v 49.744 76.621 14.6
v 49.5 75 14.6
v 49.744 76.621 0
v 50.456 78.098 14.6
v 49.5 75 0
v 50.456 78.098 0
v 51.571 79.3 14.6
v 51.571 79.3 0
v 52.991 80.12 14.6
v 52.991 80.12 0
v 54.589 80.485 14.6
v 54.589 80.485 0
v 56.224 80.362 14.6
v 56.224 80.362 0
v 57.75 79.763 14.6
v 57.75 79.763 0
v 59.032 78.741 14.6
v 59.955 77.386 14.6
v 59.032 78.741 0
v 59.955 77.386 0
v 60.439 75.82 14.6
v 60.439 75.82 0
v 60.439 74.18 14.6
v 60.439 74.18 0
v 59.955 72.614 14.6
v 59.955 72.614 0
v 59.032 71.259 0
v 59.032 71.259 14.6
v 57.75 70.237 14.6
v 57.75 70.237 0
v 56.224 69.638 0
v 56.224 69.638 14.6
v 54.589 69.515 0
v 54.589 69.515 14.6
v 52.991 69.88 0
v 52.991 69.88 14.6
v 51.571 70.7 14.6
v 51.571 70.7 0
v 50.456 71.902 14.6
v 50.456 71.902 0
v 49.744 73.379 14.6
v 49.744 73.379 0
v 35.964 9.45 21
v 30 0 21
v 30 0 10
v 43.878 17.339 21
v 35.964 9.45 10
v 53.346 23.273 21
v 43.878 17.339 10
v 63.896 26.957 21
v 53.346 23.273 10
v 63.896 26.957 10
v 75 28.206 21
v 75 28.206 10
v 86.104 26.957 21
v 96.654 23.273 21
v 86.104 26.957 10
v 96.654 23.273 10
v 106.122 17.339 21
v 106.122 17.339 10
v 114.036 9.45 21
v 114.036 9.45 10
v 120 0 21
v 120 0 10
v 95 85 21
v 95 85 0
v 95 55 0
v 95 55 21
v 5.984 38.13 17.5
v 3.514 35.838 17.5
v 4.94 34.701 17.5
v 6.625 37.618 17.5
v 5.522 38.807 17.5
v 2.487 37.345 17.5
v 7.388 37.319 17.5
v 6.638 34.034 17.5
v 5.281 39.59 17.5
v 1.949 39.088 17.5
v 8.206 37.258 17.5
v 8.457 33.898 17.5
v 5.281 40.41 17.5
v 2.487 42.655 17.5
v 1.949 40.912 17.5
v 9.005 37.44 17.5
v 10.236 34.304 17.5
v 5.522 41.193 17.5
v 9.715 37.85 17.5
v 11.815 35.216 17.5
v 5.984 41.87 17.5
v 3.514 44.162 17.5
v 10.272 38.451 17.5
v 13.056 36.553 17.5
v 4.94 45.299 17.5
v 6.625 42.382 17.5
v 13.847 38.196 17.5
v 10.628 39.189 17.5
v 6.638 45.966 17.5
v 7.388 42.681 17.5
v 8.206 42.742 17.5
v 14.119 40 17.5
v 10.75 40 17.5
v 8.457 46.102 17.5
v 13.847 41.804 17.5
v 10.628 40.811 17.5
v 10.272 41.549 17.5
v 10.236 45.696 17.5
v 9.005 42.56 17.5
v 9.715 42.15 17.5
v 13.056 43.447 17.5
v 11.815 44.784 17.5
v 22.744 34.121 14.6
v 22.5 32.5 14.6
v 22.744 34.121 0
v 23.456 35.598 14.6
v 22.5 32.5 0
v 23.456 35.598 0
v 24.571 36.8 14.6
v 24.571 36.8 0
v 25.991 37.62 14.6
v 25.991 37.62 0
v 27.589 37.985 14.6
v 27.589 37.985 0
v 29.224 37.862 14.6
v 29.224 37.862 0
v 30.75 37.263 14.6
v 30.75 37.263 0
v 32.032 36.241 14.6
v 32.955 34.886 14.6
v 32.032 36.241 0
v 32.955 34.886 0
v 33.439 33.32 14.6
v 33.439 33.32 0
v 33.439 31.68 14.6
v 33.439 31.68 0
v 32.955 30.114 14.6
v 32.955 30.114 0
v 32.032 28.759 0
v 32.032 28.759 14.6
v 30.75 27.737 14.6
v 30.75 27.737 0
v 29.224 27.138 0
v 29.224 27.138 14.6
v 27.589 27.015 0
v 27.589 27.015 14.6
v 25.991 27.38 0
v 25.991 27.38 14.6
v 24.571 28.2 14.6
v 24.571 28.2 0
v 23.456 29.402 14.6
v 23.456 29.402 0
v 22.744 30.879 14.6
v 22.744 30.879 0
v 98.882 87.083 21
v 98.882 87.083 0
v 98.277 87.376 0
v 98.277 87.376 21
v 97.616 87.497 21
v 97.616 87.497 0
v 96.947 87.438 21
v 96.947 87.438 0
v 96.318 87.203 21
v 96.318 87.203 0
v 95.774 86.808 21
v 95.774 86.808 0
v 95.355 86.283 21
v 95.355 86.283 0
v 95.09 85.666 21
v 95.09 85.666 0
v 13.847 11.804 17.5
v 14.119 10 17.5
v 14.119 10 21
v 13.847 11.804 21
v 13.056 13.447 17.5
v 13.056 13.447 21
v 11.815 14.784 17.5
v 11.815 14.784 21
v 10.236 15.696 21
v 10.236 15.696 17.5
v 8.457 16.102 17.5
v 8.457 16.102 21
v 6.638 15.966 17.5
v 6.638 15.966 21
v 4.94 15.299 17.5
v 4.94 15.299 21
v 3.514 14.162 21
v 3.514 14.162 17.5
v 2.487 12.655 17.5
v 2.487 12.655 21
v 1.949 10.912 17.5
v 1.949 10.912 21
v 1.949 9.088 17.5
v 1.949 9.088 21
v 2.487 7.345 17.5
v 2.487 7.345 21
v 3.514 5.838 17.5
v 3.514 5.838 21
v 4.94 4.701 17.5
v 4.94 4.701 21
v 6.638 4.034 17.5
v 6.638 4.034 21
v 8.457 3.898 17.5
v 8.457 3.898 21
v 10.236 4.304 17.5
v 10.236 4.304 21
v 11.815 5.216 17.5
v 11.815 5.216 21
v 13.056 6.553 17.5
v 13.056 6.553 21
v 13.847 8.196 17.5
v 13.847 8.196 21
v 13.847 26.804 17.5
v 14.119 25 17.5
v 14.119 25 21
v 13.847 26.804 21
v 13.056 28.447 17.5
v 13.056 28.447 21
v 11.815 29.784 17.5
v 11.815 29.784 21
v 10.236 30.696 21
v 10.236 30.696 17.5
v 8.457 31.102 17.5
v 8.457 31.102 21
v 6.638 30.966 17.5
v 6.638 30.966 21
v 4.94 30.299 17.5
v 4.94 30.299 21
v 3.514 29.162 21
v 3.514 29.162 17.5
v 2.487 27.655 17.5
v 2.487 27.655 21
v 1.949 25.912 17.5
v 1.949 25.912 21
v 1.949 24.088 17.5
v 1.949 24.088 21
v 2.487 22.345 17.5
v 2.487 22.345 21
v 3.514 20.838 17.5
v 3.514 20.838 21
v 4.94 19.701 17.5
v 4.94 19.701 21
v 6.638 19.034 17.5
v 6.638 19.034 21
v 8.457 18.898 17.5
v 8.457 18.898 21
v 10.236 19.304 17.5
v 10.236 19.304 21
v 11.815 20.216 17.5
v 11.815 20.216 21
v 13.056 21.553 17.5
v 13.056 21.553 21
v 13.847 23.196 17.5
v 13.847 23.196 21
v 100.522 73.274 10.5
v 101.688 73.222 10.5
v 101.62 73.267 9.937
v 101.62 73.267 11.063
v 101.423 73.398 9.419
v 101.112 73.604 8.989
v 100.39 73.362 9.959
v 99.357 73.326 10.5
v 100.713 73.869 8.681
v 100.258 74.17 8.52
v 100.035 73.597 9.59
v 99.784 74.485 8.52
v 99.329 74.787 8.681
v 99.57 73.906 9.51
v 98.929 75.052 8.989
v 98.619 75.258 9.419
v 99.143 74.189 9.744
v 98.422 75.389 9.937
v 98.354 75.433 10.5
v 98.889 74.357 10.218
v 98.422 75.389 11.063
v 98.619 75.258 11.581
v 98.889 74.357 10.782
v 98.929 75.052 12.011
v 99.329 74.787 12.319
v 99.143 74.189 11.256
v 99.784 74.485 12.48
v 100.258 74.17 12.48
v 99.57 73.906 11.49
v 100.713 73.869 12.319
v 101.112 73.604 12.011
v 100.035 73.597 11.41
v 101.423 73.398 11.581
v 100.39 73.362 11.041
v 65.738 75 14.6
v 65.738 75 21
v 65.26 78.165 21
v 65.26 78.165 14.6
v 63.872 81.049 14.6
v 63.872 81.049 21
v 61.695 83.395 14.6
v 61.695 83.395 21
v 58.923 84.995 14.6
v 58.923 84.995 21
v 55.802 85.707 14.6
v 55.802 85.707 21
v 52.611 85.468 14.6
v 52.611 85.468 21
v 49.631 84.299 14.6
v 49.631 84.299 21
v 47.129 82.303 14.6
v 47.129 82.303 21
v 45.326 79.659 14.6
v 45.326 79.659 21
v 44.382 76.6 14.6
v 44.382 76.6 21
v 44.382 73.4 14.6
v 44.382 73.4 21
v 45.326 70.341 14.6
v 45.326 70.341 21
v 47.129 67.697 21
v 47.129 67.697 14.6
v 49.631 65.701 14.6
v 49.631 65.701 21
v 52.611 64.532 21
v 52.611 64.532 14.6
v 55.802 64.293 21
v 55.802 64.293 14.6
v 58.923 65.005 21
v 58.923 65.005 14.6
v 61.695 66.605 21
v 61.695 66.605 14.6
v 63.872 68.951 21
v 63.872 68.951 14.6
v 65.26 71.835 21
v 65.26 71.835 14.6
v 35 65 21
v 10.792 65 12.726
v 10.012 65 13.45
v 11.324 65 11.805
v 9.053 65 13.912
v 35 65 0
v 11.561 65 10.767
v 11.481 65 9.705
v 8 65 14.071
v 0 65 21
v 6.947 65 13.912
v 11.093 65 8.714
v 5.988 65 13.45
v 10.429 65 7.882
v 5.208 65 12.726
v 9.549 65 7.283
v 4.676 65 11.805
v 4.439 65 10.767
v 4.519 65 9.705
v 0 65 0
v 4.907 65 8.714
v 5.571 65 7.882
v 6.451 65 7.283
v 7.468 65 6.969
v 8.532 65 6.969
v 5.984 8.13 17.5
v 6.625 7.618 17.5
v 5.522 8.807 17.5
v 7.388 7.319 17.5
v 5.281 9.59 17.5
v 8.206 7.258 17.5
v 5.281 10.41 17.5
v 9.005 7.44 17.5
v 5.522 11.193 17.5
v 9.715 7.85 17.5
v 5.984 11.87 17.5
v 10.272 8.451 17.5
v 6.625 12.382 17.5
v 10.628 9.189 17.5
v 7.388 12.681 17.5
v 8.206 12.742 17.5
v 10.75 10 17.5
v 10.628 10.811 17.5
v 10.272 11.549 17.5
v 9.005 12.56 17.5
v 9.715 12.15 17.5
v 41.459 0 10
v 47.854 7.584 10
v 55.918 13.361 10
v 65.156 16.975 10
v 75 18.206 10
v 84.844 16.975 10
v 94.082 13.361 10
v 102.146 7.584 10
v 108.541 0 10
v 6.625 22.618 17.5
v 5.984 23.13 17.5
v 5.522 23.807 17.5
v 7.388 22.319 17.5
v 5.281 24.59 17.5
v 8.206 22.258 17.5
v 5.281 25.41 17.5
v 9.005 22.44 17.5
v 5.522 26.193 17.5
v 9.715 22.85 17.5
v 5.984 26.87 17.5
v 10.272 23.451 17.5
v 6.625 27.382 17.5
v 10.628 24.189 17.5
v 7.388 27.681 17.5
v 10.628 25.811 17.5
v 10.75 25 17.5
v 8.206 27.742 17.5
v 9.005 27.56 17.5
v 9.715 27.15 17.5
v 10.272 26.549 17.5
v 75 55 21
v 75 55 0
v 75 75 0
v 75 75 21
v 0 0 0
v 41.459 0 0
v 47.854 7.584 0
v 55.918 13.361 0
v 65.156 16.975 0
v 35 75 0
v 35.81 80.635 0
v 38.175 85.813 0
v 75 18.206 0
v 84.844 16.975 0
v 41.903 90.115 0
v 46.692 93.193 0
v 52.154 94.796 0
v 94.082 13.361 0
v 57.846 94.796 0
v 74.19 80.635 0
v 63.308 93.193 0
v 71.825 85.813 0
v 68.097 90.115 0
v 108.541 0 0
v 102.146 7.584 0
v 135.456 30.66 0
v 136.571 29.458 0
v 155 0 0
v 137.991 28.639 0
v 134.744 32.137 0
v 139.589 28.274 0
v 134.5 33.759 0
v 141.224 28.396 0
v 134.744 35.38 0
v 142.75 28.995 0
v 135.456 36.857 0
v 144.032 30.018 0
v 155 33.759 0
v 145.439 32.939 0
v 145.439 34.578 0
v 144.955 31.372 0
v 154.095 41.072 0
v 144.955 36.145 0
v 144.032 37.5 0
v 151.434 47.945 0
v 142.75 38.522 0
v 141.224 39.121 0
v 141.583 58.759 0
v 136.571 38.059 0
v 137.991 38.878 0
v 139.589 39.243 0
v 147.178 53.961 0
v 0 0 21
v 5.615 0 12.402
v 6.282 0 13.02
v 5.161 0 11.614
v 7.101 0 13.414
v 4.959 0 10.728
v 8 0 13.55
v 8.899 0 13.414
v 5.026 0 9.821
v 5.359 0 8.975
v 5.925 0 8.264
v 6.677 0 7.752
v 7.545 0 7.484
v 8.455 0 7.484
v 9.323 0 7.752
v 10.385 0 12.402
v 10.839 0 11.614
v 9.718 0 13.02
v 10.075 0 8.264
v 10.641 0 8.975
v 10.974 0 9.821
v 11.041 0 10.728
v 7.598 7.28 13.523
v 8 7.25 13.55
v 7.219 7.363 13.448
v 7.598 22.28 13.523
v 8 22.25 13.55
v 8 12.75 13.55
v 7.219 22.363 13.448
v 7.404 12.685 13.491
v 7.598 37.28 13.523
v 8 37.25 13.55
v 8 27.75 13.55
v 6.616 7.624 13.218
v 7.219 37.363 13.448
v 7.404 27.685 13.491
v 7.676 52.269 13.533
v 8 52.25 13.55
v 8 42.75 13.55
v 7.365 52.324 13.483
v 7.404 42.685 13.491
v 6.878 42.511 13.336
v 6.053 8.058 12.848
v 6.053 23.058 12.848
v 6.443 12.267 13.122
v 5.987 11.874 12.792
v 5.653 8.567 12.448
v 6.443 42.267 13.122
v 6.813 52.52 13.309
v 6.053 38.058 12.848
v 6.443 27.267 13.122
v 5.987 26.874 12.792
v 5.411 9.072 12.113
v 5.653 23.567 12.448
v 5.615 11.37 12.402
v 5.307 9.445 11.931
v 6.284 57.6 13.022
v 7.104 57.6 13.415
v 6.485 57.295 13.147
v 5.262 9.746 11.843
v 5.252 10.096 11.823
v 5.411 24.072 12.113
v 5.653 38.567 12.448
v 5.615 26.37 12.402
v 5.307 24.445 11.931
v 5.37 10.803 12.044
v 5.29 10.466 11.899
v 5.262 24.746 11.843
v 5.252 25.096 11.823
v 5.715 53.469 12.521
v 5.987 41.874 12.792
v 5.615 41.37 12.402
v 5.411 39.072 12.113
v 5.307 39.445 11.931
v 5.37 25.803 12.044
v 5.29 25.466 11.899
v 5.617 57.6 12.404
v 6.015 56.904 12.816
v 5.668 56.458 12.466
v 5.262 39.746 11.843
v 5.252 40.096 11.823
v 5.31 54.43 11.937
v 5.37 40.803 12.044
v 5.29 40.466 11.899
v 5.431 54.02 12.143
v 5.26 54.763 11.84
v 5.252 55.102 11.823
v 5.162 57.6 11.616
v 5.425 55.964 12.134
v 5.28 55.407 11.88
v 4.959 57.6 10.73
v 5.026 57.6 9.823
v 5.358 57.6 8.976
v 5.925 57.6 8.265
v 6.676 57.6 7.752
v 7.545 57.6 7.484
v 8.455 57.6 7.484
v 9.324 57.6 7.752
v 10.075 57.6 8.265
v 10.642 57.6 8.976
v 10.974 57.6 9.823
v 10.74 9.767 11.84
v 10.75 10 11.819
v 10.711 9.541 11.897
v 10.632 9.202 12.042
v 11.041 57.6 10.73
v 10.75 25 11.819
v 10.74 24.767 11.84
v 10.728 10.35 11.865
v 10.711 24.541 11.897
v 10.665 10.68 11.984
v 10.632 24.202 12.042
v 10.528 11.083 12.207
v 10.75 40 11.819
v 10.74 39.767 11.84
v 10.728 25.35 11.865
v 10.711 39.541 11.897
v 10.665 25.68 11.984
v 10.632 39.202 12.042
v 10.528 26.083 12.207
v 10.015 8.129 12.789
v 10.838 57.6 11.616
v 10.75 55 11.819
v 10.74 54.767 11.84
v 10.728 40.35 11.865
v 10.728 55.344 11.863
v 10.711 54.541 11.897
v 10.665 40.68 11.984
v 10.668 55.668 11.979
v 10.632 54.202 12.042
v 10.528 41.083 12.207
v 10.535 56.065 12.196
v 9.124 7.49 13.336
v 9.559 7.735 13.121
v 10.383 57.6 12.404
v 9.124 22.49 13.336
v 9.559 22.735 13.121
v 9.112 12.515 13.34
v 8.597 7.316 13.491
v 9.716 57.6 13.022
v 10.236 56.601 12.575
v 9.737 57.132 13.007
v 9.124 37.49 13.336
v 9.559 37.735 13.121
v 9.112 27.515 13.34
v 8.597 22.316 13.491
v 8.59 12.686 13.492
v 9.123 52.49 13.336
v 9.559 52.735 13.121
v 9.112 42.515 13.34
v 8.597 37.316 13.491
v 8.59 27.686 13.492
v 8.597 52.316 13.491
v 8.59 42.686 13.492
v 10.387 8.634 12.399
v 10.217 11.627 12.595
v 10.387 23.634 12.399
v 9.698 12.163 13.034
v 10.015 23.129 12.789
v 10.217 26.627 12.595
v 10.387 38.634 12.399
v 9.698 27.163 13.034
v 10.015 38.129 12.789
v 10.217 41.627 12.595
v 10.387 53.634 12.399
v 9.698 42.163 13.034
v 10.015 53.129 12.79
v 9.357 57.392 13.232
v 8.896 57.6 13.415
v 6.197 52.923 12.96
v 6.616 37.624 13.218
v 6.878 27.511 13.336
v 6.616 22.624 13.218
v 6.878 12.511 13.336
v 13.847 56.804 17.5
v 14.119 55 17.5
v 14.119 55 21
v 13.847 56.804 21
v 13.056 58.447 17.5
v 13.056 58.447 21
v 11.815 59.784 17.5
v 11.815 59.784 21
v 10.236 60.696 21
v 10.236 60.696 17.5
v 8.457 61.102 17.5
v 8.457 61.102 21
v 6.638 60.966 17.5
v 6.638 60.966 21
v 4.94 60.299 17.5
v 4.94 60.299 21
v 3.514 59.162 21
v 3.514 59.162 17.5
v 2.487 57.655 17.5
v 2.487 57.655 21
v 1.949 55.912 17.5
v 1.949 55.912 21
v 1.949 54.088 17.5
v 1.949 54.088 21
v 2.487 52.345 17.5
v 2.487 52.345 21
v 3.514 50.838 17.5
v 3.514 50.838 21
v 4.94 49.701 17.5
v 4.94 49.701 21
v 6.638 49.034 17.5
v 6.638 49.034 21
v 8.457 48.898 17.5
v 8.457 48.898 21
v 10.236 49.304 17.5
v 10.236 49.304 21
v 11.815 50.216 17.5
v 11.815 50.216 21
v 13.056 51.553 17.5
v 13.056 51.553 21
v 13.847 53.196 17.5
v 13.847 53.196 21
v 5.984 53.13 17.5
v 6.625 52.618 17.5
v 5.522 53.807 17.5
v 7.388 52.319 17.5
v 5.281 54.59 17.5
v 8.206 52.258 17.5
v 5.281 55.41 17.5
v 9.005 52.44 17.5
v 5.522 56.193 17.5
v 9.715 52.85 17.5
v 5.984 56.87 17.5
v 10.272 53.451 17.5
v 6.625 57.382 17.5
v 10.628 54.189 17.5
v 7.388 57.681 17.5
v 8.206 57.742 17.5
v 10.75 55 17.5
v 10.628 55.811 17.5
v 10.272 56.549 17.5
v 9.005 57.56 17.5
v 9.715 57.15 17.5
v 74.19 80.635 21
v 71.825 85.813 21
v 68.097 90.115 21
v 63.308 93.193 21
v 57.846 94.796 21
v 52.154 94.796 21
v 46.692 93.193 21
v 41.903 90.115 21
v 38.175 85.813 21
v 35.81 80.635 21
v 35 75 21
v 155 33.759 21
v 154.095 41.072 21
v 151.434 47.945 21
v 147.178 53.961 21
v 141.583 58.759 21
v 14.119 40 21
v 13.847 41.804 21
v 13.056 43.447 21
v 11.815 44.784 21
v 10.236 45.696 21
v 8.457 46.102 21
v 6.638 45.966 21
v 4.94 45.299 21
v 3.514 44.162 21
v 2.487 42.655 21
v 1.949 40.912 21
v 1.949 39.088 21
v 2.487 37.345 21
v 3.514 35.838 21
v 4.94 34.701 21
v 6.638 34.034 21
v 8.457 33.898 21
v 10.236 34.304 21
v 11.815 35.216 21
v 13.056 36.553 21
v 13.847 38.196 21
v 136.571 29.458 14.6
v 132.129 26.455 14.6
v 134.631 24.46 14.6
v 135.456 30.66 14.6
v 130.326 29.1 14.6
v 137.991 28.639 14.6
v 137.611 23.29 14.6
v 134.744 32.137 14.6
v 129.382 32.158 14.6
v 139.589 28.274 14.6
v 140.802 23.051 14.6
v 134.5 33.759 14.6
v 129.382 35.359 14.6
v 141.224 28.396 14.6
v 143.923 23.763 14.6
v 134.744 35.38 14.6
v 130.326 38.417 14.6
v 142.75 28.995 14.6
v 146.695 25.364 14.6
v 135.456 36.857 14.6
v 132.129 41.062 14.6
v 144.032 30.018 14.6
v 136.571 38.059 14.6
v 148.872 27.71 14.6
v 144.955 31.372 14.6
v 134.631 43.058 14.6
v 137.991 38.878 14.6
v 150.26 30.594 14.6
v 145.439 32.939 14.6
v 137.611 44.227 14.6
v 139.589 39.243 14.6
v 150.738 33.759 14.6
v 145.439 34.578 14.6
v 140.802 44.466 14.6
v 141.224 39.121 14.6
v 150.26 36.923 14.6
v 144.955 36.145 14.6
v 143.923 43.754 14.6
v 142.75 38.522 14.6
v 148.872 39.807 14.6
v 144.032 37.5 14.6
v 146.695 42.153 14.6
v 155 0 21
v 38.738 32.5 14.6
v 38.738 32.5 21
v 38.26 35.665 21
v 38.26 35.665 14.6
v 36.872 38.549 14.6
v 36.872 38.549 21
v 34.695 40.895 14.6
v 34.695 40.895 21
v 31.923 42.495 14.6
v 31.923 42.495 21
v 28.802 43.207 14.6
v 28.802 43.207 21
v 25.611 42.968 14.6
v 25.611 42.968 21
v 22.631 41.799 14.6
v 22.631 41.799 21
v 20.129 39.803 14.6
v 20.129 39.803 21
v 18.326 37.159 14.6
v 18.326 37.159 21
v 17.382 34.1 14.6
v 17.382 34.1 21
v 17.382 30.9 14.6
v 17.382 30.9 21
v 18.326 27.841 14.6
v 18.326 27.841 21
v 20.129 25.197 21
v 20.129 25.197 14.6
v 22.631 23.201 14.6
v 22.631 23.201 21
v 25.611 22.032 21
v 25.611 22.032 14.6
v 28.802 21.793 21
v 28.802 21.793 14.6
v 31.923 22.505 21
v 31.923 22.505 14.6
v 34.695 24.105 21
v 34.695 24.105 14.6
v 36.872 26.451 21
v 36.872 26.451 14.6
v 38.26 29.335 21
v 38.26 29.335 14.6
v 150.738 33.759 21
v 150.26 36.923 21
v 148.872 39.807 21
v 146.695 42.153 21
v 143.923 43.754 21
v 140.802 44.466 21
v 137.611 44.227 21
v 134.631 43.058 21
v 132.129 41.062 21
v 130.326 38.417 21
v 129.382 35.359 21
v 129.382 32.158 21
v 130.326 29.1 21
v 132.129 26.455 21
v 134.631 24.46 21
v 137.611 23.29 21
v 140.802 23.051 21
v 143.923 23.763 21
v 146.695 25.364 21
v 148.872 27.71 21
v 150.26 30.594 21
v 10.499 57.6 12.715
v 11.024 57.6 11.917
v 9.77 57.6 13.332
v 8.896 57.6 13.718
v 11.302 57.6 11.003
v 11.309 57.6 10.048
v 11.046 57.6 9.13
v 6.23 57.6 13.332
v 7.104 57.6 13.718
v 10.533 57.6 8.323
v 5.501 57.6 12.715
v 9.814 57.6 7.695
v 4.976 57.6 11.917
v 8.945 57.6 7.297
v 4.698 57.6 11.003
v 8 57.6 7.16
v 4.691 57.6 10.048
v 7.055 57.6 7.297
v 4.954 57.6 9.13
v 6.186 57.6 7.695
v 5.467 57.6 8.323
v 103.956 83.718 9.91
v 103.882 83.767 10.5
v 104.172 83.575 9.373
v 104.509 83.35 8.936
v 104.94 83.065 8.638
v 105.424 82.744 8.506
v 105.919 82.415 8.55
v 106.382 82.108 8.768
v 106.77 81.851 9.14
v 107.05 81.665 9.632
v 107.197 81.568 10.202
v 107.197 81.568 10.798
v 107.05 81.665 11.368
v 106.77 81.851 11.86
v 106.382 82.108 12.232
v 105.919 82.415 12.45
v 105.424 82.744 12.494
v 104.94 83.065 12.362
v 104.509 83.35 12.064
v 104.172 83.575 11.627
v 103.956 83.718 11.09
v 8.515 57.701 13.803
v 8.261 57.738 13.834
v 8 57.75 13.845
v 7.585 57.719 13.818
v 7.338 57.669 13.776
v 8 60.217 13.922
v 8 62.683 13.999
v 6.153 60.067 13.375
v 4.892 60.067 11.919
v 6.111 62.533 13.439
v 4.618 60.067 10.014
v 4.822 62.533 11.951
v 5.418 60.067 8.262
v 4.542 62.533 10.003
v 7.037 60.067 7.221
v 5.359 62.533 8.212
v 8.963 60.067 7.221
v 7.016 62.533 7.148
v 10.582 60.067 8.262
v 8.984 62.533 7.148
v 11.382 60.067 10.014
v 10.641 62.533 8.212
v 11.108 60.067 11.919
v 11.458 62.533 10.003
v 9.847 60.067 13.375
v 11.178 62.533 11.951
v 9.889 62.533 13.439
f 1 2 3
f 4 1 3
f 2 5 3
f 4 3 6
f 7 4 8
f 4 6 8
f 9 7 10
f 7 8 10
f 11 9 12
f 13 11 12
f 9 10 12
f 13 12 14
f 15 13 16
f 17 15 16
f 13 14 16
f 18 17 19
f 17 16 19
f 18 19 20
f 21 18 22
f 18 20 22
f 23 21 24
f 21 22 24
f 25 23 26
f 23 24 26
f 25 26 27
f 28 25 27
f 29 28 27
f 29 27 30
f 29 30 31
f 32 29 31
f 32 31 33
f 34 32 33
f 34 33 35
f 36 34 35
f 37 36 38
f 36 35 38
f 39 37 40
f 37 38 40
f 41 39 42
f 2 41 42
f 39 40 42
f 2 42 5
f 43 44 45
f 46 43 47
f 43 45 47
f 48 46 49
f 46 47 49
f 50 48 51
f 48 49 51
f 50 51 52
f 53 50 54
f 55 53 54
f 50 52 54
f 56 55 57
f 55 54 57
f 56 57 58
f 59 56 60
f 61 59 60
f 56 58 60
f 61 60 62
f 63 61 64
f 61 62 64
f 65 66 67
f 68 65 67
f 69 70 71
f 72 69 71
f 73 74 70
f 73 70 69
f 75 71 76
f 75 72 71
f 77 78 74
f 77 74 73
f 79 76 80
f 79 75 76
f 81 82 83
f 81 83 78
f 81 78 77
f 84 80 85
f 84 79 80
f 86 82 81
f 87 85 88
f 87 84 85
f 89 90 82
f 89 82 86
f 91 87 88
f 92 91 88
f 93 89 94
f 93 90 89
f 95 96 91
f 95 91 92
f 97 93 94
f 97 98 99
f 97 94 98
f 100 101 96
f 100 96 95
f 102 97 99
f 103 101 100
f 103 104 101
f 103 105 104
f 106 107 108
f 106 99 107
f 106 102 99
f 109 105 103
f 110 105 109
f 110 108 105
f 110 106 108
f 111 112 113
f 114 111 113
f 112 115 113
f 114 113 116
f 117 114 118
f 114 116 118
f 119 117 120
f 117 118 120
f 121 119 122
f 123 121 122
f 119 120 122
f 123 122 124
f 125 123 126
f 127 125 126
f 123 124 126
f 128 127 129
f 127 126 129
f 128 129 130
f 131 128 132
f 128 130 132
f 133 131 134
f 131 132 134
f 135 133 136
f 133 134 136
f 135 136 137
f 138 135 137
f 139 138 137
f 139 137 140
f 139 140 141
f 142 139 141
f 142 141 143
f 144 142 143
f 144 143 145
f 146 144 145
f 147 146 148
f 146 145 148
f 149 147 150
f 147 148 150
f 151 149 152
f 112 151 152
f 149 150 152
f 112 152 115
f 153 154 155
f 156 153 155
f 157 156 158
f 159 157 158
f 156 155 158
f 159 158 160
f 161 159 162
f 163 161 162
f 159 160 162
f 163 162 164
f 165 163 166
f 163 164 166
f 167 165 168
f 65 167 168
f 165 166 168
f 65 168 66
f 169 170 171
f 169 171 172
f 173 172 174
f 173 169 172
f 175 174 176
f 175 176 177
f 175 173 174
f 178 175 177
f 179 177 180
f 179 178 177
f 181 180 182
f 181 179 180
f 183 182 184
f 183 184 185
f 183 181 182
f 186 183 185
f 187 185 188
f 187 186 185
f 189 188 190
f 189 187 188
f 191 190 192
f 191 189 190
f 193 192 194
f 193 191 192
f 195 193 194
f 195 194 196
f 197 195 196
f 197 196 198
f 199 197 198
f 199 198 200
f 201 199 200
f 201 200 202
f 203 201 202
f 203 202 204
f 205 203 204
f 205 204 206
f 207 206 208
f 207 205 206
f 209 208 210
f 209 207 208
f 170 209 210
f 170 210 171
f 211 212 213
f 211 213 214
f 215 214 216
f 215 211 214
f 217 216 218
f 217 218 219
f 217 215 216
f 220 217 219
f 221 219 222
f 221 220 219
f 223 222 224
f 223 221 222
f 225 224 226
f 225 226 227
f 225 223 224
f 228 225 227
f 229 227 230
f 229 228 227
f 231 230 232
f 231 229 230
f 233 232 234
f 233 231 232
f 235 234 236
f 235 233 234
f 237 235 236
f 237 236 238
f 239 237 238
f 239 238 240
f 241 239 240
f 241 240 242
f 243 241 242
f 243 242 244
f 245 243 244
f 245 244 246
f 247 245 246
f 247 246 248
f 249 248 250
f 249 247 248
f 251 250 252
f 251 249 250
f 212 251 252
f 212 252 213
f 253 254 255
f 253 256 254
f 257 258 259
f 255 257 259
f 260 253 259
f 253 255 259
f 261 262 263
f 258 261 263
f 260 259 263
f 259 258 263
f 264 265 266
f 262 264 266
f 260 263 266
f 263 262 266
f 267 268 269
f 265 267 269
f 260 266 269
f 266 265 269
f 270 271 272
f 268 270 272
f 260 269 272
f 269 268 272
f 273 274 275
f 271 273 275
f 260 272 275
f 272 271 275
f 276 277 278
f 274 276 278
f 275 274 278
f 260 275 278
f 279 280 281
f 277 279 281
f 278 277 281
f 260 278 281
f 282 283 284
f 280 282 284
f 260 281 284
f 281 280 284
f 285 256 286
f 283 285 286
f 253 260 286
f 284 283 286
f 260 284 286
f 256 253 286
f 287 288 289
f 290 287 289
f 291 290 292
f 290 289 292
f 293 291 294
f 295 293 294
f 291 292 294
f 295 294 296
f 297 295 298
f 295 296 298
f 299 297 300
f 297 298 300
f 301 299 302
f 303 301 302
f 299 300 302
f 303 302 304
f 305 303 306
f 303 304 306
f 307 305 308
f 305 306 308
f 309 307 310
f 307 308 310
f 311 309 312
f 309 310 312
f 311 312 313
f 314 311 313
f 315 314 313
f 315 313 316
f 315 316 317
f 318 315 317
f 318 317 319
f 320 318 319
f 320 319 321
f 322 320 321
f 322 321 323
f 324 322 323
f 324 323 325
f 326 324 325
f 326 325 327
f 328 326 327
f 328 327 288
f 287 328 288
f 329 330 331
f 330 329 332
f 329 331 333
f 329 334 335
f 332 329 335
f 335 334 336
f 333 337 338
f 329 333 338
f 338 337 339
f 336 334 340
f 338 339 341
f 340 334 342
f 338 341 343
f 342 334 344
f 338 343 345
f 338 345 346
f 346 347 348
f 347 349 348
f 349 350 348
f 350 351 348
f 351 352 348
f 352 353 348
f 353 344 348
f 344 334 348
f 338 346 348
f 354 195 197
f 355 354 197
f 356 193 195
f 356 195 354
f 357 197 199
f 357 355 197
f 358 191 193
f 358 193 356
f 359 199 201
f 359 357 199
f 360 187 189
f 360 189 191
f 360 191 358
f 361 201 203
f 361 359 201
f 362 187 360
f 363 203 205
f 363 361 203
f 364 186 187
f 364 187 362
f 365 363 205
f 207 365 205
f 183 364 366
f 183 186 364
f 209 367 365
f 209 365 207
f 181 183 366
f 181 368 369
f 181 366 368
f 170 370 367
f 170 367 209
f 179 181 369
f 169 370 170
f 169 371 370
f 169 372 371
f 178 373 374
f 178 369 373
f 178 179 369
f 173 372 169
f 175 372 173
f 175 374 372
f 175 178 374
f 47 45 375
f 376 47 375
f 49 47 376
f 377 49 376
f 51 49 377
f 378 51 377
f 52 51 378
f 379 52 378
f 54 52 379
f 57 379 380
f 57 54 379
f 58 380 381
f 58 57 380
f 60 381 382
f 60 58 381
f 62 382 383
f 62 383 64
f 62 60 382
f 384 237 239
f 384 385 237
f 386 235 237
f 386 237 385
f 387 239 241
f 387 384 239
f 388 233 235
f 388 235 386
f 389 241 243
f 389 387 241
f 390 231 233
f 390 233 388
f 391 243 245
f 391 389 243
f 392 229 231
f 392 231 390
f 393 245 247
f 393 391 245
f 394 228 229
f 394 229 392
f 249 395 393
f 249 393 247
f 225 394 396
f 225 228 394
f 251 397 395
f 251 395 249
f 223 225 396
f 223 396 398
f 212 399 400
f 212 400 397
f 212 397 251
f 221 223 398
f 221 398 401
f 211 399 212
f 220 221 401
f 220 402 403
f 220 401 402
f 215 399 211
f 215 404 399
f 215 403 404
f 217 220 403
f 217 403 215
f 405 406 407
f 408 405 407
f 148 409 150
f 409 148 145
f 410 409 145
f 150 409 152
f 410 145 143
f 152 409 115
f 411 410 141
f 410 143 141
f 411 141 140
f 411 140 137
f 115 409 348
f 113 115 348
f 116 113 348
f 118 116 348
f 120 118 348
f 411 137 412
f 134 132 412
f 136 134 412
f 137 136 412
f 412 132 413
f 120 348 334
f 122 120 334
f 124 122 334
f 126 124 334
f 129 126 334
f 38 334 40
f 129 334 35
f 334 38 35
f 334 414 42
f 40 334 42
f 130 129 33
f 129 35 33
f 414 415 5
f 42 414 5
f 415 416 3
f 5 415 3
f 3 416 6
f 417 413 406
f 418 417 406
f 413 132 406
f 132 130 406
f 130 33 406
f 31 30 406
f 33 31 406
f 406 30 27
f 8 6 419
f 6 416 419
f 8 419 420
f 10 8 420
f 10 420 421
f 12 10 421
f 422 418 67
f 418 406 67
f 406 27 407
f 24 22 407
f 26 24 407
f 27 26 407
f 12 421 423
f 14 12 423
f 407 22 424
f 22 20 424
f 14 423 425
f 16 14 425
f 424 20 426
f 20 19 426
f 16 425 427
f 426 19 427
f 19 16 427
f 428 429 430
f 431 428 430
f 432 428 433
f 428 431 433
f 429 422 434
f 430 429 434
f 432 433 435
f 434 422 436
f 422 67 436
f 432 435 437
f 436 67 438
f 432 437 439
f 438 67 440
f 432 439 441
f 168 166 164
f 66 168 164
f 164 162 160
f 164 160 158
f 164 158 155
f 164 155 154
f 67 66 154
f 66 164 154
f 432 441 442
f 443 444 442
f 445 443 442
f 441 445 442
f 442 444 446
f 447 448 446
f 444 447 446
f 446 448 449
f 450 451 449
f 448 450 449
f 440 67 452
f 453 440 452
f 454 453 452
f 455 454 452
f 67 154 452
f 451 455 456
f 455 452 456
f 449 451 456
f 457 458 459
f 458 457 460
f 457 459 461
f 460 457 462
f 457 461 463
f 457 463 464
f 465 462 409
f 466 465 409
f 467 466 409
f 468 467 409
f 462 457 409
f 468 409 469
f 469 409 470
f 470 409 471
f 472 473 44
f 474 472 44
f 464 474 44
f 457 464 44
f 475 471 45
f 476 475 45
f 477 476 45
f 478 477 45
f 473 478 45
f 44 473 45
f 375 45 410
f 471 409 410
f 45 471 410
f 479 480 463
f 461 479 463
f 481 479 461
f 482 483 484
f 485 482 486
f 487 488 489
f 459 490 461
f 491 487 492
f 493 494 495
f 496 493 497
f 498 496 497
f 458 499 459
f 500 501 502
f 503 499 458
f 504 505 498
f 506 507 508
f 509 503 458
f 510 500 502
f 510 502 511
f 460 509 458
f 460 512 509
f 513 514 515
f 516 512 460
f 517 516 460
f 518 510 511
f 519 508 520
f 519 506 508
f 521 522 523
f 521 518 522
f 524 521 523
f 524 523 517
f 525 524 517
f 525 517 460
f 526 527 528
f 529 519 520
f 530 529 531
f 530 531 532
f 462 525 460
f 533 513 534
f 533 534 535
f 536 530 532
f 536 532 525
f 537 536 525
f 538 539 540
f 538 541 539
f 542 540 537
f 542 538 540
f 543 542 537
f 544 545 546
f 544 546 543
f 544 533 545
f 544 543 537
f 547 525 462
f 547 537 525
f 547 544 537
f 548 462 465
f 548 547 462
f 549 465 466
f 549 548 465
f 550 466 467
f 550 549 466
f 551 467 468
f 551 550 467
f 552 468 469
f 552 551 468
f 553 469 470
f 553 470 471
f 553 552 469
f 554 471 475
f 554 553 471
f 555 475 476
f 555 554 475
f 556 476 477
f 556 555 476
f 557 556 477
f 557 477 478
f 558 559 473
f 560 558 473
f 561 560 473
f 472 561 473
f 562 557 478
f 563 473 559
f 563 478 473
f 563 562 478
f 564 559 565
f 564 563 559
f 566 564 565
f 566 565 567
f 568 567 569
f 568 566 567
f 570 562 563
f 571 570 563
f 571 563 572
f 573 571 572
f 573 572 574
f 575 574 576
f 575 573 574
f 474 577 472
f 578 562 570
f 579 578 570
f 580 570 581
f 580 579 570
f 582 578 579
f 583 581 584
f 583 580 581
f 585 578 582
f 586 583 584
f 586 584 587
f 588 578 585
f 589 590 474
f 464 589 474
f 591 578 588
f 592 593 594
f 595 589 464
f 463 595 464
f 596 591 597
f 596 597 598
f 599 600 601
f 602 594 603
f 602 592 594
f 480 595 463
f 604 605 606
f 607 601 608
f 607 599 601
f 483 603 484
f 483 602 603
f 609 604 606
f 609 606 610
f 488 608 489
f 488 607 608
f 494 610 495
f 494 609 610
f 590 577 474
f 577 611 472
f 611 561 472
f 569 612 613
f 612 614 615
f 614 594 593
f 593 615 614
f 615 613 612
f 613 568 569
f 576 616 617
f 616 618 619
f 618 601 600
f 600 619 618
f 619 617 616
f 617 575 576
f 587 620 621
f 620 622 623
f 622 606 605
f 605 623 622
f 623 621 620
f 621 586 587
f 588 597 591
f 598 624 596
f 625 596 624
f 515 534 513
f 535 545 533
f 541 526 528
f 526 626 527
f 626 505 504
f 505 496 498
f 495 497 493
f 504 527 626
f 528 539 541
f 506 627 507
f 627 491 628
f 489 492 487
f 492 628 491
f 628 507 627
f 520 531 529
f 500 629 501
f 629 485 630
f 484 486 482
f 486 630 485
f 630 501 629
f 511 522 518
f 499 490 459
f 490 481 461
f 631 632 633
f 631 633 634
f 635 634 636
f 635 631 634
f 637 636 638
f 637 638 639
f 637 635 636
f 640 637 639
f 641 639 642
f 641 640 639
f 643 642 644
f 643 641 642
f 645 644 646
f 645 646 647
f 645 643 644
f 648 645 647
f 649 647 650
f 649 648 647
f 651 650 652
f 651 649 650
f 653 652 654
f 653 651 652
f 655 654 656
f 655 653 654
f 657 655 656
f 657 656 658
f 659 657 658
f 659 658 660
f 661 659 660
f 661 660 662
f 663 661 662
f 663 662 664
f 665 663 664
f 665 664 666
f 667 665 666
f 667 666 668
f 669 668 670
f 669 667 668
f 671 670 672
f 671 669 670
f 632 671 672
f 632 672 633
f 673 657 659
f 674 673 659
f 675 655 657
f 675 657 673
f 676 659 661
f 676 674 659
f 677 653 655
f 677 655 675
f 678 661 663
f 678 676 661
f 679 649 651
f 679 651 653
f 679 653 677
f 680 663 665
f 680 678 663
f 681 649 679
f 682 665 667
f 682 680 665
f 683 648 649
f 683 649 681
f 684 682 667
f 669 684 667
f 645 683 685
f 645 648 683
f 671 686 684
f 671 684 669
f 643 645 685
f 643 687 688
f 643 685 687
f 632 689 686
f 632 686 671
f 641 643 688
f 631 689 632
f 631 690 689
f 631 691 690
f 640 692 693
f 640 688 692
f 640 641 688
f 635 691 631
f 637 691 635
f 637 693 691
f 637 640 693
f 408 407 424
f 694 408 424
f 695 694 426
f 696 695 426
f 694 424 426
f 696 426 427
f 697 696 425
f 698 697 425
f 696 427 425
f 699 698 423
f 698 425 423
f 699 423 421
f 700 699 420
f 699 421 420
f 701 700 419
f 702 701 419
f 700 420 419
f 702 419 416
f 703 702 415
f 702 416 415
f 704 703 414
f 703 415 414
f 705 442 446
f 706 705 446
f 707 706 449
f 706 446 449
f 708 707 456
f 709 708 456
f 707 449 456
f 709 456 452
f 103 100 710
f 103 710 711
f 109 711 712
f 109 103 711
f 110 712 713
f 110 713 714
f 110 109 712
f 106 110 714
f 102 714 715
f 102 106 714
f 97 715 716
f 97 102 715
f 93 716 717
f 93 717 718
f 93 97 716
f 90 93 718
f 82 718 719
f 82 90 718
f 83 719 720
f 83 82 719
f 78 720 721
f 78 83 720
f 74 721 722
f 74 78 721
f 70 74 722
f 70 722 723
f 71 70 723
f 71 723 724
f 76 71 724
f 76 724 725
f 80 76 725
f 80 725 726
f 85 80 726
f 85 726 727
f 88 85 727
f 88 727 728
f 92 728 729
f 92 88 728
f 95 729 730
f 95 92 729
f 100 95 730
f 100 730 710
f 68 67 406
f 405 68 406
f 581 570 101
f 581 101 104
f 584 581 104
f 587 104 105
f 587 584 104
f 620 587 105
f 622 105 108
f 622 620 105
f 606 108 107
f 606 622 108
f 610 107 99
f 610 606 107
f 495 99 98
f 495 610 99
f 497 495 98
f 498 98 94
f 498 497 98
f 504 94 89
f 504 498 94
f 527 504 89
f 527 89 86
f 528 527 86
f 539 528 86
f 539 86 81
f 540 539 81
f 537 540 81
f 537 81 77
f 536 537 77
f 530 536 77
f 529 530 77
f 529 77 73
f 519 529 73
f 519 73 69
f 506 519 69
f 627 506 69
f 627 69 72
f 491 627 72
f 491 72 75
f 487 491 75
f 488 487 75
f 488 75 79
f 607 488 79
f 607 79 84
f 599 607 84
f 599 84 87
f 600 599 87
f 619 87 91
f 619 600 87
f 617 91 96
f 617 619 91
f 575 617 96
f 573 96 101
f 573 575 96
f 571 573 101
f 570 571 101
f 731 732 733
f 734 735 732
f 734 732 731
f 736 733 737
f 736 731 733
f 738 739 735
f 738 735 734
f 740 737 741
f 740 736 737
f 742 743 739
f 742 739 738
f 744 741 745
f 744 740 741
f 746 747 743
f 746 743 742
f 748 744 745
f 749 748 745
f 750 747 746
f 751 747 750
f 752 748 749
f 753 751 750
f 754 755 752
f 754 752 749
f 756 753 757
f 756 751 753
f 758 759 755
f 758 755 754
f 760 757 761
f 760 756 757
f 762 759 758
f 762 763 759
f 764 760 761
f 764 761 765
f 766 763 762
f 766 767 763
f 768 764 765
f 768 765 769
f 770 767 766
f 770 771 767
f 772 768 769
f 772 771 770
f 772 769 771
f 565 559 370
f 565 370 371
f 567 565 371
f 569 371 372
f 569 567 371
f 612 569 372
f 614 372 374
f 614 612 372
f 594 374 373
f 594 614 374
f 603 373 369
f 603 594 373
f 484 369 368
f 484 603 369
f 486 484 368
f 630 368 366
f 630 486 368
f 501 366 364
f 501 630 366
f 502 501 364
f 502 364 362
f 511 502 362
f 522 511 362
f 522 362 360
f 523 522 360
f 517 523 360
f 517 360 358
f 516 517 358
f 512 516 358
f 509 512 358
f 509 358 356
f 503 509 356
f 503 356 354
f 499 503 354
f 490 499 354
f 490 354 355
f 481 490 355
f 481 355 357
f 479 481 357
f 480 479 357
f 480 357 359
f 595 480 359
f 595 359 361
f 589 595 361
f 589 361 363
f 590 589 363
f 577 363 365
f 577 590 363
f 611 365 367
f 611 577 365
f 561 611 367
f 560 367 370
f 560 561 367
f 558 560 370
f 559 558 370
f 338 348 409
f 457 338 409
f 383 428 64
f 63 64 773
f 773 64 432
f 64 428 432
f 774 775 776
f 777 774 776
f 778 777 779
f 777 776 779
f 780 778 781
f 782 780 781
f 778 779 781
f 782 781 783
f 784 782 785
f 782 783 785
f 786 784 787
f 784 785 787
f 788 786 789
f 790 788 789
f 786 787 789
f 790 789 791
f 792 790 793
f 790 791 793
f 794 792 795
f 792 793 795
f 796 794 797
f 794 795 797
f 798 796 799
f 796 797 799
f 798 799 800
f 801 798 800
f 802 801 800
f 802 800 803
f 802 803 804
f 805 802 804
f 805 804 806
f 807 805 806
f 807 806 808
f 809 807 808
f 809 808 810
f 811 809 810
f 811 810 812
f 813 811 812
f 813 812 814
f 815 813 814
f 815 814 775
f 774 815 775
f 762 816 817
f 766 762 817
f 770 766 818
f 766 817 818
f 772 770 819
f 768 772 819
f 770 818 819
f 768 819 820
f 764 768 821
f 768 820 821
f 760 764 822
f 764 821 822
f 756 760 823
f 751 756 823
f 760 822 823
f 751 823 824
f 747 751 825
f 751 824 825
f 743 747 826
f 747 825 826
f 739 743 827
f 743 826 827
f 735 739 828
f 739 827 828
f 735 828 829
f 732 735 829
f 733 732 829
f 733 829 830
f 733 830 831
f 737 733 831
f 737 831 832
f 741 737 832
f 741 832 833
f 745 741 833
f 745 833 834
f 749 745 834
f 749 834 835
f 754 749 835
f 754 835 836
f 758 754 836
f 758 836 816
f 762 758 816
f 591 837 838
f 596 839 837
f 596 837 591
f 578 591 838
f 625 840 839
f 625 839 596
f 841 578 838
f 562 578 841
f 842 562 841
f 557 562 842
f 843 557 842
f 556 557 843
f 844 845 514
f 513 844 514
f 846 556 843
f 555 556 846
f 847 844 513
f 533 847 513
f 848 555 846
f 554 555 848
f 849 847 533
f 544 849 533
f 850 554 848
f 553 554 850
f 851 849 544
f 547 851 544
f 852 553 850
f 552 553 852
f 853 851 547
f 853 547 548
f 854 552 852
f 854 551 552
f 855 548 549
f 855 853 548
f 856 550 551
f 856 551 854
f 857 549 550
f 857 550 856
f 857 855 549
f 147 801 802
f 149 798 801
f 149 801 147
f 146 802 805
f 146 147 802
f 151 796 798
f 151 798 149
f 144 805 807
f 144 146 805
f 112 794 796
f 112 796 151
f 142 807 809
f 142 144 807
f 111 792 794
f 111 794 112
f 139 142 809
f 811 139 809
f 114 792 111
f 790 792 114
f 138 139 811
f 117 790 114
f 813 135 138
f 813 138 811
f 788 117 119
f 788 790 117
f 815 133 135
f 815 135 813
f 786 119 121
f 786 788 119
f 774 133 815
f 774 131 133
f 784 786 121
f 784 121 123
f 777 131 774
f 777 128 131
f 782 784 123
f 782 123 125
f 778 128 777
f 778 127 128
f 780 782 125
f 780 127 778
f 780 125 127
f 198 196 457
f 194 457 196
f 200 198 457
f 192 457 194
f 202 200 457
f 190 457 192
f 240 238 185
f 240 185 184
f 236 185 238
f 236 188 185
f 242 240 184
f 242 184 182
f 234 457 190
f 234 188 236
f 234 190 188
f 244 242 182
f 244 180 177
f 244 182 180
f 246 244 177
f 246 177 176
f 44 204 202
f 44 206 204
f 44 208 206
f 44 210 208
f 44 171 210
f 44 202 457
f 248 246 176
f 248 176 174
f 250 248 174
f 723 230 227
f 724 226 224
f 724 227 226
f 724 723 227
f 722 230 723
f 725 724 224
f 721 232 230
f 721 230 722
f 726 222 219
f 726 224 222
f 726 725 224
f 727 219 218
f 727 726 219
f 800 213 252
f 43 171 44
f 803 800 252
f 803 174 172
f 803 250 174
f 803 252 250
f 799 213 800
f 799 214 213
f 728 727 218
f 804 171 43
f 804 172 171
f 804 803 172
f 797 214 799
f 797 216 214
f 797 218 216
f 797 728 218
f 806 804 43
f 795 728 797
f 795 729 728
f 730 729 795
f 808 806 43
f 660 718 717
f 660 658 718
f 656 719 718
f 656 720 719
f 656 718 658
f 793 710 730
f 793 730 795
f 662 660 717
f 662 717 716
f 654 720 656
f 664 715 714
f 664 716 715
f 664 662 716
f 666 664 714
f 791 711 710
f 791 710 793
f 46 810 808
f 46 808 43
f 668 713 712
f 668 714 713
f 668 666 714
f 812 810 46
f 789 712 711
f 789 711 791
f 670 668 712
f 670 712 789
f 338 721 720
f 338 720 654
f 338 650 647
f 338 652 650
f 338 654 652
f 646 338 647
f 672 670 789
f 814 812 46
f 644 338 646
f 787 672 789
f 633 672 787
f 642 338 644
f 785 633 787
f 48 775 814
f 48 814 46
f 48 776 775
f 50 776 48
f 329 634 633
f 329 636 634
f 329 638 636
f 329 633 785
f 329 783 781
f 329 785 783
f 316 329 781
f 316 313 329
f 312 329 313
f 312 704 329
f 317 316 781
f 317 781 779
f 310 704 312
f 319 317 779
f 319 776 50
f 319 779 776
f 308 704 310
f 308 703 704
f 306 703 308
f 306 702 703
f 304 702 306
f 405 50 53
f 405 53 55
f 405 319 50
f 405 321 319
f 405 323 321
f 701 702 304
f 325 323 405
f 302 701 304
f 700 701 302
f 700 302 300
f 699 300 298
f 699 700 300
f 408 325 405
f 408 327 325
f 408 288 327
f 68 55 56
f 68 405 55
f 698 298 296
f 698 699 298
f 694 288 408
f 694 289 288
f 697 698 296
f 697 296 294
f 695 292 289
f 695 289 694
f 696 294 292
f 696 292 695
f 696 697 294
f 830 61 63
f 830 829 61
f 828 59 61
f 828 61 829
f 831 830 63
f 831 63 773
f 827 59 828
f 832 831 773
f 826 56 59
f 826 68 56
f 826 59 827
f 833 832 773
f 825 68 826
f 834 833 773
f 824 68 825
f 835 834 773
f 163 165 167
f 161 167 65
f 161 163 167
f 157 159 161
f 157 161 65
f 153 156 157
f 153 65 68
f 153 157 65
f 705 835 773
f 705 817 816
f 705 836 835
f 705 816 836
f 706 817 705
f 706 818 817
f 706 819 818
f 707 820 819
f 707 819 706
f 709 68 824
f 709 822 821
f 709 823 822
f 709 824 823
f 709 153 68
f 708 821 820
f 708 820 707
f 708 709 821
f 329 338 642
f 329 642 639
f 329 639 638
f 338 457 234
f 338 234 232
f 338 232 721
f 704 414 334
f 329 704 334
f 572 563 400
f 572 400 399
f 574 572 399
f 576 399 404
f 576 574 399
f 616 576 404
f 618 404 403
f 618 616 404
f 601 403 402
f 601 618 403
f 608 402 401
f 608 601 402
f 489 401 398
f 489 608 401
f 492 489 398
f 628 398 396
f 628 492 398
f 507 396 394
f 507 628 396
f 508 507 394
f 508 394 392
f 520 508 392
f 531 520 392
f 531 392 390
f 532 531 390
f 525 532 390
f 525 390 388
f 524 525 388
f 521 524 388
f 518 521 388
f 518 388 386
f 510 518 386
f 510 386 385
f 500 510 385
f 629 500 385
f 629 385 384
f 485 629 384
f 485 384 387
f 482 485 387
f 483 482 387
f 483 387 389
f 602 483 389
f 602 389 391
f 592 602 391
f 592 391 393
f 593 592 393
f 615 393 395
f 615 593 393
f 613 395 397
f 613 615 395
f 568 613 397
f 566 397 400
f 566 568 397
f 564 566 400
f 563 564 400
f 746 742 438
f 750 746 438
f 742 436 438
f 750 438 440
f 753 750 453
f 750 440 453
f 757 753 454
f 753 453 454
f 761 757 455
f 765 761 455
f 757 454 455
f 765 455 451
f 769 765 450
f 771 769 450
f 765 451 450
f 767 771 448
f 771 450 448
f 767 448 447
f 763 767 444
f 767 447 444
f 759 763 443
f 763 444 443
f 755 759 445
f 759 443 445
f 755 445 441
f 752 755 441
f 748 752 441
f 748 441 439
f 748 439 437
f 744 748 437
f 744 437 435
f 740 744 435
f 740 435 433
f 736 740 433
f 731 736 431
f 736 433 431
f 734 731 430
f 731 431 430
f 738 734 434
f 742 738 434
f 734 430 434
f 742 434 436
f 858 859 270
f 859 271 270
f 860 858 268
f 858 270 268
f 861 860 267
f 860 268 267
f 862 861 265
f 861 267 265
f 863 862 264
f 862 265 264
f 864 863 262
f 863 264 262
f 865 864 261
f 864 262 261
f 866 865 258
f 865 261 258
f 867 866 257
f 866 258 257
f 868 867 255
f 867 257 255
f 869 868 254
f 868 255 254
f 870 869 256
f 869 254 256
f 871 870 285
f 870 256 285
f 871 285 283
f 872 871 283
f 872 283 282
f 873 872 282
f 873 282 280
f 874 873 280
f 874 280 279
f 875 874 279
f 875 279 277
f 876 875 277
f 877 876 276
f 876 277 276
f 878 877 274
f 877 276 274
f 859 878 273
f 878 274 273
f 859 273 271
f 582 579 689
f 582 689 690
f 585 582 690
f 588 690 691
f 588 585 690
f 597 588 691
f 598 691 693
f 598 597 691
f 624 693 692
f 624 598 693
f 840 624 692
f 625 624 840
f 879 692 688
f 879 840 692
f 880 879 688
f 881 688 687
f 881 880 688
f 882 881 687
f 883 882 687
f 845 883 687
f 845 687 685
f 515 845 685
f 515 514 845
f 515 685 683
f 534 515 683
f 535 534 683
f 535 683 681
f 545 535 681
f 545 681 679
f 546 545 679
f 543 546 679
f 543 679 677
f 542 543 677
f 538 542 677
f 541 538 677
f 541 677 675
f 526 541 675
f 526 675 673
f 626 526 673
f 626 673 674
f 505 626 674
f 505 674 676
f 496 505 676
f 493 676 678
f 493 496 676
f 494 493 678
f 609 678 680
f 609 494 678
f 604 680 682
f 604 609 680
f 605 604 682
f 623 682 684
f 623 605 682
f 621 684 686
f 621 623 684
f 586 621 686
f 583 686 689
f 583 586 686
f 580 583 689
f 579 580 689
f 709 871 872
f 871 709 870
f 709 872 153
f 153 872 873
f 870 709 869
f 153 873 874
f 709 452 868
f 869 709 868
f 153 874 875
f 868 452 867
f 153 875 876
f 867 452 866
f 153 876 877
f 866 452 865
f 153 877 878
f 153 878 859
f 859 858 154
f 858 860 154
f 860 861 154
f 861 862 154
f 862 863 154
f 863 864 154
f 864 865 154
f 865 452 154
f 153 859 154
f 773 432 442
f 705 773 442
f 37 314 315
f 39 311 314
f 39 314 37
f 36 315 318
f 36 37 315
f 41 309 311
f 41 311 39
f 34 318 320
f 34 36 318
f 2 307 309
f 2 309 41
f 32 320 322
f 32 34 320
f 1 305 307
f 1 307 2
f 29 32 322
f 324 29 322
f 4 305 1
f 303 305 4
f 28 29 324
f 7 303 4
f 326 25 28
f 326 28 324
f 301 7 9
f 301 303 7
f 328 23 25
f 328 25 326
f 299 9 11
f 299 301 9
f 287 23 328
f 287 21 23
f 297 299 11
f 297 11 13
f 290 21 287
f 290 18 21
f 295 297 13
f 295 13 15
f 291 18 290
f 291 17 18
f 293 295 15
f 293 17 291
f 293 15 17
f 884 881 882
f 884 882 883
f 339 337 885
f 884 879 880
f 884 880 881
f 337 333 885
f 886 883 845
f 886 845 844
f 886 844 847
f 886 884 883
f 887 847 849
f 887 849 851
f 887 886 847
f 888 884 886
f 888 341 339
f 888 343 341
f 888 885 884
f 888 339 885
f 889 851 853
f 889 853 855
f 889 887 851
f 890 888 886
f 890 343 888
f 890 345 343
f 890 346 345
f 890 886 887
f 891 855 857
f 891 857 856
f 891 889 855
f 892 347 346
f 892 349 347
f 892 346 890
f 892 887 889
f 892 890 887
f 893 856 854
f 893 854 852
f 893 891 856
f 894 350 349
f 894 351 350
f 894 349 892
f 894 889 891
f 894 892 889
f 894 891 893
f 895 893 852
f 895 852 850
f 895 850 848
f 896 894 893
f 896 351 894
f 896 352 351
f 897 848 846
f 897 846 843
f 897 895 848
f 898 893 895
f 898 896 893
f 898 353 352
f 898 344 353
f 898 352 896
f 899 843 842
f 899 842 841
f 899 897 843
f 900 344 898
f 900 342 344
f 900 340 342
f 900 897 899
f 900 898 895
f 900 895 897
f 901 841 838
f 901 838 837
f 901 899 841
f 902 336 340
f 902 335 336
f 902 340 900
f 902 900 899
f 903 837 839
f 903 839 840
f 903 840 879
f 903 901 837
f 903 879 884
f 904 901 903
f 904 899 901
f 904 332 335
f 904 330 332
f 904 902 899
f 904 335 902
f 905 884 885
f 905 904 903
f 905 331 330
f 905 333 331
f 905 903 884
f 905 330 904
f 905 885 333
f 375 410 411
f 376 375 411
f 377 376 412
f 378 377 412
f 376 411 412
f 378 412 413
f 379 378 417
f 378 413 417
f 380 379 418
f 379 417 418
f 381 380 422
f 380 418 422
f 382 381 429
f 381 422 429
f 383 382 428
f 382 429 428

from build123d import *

# Parameters (mm, degrees)
BOSS_EXTRUDE1_DEPTH                      = 21
BOSS_EXTRUDE2_DEPTH                      = 10
CBORE_START                              = 17.5
CBORE_FOR_M5_HEX_HEAD_BOLT1_OUTLINE_R    = 6.119
CBORE_FOR_M5_HEX_HEAD_BOLT1_DEPTH        = 3.5
CBORE_START_2                            = 11.819091173
CBORE_FOR_M5_HEX_HEAD_BOLT1_2_OUTLINE_R  = 2.75
CBORE_FOR_M5_HEX_HEAD_BOLT1_2_DEPTH      = 5.680908827
CBORE_FOR_M10_HEX_HEAD_BOLT1_D           = 11
CBORE_FOR_M10_HEX_HEAD_BOLT1_CBORE_D     = 21.475
CBORE_FOR_M10_HEX_HEAD_BOLT1_CBORE_DEPTH = 6.4
F_4_0MM_DOWEL_HOLE1_D                    = 4
F_4_0MM_DOWEL_HOLE1_DEPTH                = 10
F_4_0MM_DOWEL_HOLE1_TIP                  = 1.201721238


# Read off the part's stored shape, not the designer's step: CBORE for M5 Hex Head Bolt1
with BuildPart() as part:
    # Sketch1 → Boss-Extrude1 (new body)
    with BuildSketch(Plane.XY):
        with BuildLine():
            Line((35, 65), (0, 65))
            Line((0, 65), (0, 0))
            Line((0, 0), (30, 0))
            ThreePointArc((30, 0), (75, 28.205505282), (120, 0))
            Line((120, 0), (155, 0))
            Line((155, 0), (155, 33.758563653))
            ThreePointArc((155, 33.758563653), (151.433820369, 47.944935308), (141.583123952, 58.758563653))
            Line((141.583123952, 58.758563653), (98.881926996, 87.083333333))
            ThreePointArc((98.881926996, 87.083333333), (96.317802362, 87.202818364), (95, 85))
            Line((95, 85), (95, 55))
            Line((95, 55), (75, 55))
            Line((75, 55), (75, 75))
            ThreePointArc((75, 75), (55, 95), (35, 75))
            Line((35, 75), (35, 65))
        make_face()
    extrude(amount=BOSS_EXTRUDE1_DEPTH)

    # Sketch2 → Boss-Extrude2 (add)
    with BuildSketch(Plane.XY):
        with BuildLine():
            Line((30, 0), (41.458980338, 0))
            ThreePointArc((41.458980338, 0), (75, 18.205505282), (108.541019662, 0))
            Line((108.541019662, 0), (120, 0))
            ThreePointArc((120, 0), (75, 28.205505282), (30, 0))
        make_face()
    extrude(amount=BOSS_EXTRUDE2_DEPTH)

    # Sketch16 → 1/16 Rc Tapped Hole1 (revolve, cut)
    with BuildSketch(Plane(origin=(8, 65, 10.5), x_dir=(0, 0, 1), z_dir=(1, 0, 0))):
        Polygon((0, 0), (0, 65), (3.05, 65), (3.05, 7.4), (3.339997004, 7.4), (3.571, 0), align=None)
    revolve(axis=Axis((8, 71.35, 10.5), (0, -1, 0)), mode=Mode.SUBTRACT)

    # CBORE for M5 Hex Head Bolt1 outline → CBORE for M5 Hex Head Bolt1 (cut)
    with BuildSketch(Plane.XY.offset(CBORE_START)):
        with Locations((8, 10)):
            Circle(CBORE_FOR_M5_HEX_HEAD_BOLT1_OUTLINE_R)
        with Locations((8, 25)):
            Circle(CBORE_FOR_M5_HEX_HEAD_BOLT1_OUTLINE_R)
        with Locations((8, 40)):
            Circle(CBORE_FOR_M5_HEX_HEAD_BOLT1_OUTLINE_R)
        with Locations((8, 55)):
            Circle(CBORE_FOR_M5_HEX_HEAD_BOLT1_OUTLINE_R)
    extrude(amount=CBORE_FOR_M5_HEX_HEAD_BOLT1_DEPTH, mode=Mode.SUBTRACT)

    # CBORE for M5 Hex Head Bolt1 2 outline → CBORE for M5 Hex Head Bolt1 2 (cut)
    with BuildSketch(Plane.XY.offset(CBORE_START_2)):
        with Locations((8, 10)):
            Circle(CBORE_FOR_M5_HEX_HEAD_BOLT1_2_OUTLINE_R)
        with Locations((8, 25)):
            Circle(CBORE_FOR_M5_HEX_HEAD_BOLT1_2_OUTLINE_R)
        with Locations((8, 40)):
            Circle(CBORE_FOR_M5_HEX_HEAD_BOLT1_2_OUTLINE_R)
        with Locations((8, 55)):
            Circle(CBORE_FOR_M5_HEX_HEAD_BOLT1_2_OUTLINE_R)
    extrude(amount=CBORE_FOR_M5_HEX_HEAD_BOLT1_2_DEPTH, mode=Mode.SUBTRACT)

    # CBORE for M10 Hex Head Bolt1 (through all)
    with Locations(Plane.XY.offset(21)):
        with Locations((28, 32.5), (55, 75), (140, 33.758563653)):
            CounterBoreHole(CBORE_FOR_M10_HEX_HEAD_BOLT1_D / 2, CBORE_FOR_M10_HEX_HEAD_BOLT1_CBORE_D / 2, CBORE_FOR_M10_HEX_HEAD_BOLT1_CBORE_DEPTH)

    # Ø4.0mm Dowel Hole1
    with Locations(Plane(origin=(70.328191882, 106.023738481, 0), x_dir=(0.8333333333333334, -0.5527707983925666, 0), z_dir=(0.5527707983925666, 0.8333333333333334, 0))):
        with Locations((42.264482137, -10.5)):
            Hole(F_4_0MM_DOWEL_HOLE1_D / 2, depth=F_4_0MM_DOWEL_HOLE1_DEPTH)
            with Locations((0, 0, -(F_4_0MM_DOWEL_HOLE1_DEPTH + F_4_0MM_DOWEL_HOLE1_TIP / 2))):  # 118° drill point
                Cone(0, F_4_0MM_DOWEL_HOLE1_D / 2, F_4_0MM_DOWEL_HOLE1_TIP, mode=Mode.SUBTRACT)


solid = part.part
